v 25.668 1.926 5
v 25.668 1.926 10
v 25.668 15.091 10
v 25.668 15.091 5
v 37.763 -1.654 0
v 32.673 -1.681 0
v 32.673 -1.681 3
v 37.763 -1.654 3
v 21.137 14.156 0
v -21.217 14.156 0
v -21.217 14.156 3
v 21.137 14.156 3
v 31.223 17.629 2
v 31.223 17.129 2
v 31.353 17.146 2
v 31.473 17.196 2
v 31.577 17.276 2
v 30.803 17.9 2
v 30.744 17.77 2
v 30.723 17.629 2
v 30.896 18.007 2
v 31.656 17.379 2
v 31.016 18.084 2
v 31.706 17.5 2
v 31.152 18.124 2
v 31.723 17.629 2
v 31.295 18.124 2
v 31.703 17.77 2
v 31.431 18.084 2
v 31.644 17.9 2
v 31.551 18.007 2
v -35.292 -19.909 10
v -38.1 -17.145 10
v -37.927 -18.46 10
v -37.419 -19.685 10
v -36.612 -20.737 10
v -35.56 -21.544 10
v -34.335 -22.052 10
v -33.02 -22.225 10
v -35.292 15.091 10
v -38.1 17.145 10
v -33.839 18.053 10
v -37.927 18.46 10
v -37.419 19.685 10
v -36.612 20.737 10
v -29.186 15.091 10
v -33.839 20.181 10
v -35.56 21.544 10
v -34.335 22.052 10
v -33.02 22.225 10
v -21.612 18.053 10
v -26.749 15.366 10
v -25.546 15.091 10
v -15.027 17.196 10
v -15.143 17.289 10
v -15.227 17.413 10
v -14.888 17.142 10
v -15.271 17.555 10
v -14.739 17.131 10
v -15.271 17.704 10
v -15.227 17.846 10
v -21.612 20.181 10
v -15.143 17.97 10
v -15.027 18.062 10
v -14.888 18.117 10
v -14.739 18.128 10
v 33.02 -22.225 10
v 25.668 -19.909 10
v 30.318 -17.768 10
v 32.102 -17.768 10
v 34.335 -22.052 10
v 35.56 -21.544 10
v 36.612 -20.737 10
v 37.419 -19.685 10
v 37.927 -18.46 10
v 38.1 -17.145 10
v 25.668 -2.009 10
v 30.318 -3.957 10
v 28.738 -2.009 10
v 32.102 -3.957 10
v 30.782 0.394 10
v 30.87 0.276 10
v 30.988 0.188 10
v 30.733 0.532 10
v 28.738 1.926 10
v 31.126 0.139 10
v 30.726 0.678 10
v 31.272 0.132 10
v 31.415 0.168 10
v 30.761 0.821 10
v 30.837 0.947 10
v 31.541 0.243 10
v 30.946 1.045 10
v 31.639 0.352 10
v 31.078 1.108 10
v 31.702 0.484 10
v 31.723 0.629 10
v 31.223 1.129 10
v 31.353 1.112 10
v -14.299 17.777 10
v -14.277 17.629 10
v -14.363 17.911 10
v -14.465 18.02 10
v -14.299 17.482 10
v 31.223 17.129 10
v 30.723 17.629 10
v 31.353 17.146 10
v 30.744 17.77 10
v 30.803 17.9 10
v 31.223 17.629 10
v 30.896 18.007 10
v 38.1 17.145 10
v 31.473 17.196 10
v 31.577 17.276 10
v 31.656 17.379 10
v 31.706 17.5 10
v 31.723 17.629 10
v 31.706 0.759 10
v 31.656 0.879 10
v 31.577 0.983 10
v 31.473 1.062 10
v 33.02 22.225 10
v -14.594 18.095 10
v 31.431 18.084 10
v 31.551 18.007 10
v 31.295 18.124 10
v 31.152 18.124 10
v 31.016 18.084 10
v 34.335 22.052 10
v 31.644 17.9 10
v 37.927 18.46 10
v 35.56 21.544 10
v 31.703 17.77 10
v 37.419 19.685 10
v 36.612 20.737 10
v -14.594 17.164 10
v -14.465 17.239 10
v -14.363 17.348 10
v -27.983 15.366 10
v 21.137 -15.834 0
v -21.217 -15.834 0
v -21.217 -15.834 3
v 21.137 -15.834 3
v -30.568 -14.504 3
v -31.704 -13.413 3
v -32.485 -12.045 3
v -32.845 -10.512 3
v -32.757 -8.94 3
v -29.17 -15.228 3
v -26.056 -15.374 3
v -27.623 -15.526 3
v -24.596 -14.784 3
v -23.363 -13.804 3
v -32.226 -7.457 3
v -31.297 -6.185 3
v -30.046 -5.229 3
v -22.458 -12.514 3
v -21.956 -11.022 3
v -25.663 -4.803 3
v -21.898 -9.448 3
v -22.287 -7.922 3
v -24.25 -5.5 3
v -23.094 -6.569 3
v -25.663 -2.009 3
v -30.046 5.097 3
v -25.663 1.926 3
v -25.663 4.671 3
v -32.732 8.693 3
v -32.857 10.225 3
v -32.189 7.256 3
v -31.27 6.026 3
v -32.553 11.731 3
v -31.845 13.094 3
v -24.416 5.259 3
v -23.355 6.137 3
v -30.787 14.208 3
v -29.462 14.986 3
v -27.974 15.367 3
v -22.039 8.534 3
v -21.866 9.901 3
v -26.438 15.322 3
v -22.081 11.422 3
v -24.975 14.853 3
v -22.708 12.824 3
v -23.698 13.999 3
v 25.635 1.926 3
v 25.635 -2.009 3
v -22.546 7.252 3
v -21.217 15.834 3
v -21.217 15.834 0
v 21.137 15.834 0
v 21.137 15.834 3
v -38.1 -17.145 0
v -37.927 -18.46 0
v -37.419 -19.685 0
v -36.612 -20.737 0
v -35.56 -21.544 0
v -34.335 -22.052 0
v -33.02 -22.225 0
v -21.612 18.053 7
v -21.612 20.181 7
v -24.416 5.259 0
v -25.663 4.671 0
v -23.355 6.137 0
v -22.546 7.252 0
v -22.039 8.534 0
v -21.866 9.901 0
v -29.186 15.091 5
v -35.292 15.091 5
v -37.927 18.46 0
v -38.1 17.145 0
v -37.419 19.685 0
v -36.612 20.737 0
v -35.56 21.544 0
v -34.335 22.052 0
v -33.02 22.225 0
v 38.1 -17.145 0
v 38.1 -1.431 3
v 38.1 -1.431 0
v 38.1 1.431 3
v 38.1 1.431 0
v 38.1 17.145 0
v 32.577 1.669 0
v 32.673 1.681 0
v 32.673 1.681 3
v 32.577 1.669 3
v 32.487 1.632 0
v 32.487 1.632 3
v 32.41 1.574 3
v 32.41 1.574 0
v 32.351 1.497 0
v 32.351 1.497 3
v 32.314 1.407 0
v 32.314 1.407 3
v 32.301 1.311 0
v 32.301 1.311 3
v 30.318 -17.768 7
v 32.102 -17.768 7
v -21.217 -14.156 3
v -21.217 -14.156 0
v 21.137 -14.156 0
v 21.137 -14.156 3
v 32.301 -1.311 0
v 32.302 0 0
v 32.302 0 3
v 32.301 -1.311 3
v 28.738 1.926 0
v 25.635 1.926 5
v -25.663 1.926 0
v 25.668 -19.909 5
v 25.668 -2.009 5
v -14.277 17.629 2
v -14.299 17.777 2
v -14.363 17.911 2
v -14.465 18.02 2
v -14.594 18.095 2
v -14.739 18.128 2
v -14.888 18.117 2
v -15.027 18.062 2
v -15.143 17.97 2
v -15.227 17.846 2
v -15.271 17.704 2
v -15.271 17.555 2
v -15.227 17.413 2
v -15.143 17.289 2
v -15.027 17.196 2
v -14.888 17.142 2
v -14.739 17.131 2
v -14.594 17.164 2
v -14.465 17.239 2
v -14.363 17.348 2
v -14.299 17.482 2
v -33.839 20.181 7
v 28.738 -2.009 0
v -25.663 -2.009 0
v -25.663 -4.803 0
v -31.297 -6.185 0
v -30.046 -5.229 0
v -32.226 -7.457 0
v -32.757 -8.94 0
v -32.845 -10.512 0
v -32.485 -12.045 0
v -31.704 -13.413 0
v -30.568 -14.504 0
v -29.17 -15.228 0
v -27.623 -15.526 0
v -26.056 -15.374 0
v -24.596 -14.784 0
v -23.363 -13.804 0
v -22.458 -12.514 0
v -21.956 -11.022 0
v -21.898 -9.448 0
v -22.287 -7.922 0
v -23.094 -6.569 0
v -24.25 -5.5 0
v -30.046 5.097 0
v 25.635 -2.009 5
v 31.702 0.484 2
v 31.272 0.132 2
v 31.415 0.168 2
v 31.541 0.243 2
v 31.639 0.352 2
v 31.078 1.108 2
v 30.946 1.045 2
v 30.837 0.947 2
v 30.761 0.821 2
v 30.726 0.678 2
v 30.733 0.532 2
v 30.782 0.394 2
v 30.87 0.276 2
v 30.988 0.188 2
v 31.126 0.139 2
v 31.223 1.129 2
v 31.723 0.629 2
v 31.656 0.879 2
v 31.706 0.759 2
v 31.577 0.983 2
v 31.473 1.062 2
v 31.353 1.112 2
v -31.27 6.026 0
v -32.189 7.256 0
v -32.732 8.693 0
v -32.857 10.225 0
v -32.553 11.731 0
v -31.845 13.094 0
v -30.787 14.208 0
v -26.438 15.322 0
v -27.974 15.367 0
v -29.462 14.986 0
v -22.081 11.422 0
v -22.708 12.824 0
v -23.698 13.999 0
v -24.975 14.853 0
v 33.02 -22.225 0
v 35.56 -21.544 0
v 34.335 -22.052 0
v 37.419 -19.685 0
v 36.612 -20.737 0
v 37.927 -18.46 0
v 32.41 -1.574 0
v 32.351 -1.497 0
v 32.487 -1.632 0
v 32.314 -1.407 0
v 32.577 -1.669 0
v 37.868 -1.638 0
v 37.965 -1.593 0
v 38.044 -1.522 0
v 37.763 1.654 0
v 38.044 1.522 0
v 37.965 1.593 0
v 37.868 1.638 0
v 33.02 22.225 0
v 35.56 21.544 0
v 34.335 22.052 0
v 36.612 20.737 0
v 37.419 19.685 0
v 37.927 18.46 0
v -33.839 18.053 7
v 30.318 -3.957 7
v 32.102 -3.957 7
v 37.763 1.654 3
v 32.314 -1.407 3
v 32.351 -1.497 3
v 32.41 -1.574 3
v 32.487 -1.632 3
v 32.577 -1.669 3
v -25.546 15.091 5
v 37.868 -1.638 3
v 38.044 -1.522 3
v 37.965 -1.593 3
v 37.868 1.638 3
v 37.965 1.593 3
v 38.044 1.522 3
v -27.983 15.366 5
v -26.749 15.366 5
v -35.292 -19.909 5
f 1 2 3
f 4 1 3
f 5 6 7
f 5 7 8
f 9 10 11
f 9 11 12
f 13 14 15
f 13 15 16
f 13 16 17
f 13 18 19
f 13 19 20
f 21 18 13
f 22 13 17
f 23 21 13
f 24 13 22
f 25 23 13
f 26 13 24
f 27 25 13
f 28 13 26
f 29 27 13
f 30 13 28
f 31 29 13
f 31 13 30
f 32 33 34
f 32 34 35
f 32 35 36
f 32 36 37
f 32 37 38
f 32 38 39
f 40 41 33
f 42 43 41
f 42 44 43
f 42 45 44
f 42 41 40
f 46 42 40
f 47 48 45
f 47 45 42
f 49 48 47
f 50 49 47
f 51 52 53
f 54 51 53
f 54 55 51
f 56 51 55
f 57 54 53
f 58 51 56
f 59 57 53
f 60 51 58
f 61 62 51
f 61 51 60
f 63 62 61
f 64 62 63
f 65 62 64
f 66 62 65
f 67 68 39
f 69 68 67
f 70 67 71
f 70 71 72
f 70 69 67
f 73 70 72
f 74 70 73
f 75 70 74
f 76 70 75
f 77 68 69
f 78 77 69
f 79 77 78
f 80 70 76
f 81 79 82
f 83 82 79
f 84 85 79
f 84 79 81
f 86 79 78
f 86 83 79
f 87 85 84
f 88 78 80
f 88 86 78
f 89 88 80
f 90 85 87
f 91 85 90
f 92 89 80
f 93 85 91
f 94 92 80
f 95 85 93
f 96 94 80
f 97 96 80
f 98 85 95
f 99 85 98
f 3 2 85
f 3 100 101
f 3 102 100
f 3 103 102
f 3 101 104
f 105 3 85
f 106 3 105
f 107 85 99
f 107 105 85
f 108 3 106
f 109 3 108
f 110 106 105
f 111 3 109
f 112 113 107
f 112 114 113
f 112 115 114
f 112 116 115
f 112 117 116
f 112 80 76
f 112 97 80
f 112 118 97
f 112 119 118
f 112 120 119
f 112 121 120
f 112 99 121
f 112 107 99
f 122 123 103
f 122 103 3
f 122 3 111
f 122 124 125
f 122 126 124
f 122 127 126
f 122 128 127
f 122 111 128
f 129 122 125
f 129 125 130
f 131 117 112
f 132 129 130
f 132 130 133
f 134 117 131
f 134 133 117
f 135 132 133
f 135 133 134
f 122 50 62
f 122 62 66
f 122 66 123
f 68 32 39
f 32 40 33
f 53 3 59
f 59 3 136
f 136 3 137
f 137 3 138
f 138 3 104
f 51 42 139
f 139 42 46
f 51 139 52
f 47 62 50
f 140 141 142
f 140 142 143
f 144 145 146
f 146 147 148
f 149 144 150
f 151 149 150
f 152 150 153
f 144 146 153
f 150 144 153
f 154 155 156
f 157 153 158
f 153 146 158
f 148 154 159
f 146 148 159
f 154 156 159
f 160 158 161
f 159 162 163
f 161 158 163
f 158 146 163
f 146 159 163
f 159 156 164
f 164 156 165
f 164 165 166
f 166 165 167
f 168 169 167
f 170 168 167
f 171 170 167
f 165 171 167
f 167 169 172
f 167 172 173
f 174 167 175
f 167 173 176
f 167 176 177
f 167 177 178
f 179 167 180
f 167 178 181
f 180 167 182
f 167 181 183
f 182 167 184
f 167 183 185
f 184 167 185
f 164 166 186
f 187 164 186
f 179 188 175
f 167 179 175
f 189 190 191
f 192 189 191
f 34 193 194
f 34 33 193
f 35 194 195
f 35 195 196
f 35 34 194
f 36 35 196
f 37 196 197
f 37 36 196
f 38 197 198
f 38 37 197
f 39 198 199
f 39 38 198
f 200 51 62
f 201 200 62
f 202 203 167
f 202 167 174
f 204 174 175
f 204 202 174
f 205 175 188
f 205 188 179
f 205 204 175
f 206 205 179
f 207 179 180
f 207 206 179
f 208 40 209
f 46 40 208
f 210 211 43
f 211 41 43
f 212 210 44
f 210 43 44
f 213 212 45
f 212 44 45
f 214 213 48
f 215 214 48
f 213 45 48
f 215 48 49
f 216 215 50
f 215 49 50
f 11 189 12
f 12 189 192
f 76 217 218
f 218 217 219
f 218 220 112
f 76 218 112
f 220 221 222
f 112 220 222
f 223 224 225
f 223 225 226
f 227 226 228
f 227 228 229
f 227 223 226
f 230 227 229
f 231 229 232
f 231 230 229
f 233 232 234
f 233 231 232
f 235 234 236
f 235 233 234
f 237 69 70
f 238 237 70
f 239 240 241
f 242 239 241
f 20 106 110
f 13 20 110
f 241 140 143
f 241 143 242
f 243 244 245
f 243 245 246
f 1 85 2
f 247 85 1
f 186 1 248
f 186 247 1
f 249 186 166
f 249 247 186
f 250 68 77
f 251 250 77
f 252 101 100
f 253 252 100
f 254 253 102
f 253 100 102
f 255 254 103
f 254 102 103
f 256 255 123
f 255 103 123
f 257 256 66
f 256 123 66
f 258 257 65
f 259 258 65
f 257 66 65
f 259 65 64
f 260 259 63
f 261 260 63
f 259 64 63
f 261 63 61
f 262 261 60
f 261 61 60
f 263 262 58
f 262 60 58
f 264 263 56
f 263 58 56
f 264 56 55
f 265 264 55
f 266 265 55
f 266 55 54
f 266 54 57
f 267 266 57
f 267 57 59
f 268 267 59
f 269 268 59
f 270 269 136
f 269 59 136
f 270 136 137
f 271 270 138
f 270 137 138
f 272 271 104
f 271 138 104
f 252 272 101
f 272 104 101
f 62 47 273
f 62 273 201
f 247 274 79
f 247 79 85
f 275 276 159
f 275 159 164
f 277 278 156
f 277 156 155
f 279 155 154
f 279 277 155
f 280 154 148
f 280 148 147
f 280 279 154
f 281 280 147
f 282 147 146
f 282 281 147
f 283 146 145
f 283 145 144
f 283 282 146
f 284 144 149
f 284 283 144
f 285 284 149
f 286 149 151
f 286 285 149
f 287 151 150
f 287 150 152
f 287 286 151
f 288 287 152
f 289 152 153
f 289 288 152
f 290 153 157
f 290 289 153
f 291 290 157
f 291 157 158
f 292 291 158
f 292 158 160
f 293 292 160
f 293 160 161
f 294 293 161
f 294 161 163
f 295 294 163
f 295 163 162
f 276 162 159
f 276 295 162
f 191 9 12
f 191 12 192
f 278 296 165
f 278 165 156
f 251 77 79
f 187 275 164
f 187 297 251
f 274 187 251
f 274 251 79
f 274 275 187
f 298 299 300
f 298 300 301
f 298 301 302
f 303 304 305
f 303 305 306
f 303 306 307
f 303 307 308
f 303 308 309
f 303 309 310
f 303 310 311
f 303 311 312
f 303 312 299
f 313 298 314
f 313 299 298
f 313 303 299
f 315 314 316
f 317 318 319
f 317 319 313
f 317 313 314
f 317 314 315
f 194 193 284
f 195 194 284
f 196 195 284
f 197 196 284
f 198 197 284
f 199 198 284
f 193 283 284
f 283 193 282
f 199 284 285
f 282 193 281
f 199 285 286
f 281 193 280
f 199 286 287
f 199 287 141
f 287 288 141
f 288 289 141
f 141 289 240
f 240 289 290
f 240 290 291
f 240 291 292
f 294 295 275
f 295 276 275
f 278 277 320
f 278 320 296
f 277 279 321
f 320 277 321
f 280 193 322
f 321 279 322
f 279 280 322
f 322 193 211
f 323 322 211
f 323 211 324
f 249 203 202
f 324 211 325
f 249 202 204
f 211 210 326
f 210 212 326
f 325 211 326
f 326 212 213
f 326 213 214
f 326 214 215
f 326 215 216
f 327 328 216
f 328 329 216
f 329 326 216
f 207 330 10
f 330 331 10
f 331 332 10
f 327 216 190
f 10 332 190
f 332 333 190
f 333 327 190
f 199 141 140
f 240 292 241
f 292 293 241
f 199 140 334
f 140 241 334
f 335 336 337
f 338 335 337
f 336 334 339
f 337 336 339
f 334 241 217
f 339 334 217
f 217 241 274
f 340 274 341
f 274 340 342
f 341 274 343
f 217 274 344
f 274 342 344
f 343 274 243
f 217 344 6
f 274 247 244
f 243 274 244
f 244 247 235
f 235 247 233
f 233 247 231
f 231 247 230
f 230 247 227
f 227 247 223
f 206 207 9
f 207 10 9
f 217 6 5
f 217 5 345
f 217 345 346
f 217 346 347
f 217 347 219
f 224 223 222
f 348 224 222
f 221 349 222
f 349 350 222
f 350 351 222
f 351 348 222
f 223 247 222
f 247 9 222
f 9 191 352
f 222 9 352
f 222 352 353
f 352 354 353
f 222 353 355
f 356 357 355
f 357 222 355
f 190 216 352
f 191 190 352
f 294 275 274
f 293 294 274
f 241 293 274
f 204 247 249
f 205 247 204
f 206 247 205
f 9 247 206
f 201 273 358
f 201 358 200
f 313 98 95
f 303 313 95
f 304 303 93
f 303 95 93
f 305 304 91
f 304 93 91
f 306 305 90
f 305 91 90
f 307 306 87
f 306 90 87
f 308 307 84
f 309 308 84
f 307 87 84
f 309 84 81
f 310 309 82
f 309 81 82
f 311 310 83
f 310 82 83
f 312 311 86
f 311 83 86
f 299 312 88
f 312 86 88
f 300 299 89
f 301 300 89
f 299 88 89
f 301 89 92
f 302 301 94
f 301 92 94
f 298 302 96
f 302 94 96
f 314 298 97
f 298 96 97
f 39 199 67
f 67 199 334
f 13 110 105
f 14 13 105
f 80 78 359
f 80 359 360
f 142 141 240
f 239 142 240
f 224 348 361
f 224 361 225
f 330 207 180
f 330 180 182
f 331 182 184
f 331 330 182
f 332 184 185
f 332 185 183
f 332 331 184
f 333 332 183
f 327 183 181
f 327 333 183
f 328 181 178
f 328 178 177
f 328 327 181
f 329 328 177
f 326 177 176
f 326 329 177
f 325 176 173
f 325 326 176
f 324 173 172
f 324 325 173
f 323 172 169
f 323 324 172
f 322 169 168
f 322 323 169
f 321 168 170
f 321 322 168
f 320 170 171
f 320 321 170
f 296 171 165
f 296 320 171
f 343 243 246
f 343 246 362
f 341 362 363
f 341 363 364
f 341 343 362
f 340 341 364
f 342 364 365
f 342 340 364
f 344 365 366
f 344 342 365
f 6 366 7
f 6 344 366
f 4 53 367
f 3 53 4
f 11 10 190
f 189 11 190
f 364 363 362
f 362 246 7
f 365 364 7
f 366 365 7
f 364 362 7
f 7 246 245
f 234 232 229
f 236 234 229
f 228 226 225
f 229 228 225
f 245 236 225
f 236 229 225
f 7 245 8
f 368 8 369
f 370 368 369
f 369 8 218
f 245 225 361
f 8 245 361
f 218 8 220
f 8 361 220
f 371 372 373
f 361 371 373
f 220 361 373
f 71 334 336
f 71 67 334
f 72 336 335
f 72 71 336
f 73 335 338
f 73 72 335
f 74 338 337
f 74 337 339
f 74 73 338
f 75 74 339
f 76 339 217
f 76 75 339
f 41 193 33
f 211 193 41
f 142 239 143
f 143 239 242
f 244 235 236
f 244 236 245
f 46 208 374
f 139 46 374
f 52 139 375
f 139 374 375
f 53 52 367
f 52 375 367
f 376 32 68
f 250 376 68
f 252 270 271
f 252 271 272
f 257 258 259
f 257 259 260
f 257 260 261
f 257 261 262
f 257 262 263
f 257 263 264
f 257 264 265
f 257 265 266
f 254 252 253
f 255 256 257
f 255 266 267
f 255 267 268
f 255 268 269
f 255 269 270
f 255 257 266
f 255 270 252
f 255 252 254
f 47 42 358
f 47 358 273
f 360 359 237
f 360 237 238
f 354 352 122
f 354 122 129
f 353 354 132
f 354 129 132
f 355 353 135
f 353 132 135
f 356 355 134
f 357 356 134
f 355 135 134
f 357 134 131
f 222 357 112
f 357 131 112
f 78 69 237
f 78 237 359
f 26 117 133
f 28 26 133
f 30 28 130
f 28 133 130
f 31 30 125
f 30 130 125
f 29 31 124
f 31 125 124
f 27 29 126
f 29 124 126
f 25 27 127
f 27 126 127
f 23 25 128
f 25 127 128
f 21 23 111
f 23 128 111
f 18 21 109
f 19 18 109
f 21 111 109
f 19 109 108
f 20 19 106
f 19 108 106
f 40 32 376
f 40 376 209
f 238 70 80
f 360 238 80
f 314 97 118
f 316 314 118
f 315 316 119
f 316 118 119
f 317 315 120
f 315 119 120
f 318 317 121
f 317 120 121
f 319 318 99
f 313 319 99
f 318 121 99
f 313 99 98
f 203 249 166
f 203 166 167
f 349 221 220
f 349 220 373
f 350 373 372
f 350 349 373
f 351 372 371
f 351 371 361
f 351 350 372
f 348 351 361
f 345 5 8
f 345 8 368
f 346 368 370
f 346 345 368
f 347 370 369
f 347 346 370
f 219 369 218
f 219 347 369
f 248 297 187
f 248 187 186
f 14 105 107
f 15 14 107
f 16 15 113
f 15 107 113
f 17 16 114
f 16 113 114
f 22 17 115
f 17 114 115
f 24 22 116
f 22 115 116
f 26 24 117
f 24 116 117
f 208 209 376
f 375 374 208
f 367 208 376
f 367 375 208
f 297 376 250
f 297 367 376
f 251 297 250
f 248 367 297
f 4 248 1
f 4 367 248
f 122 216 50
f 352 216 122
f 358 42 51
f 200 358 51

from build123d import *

# Parameters (mm, degrees)
F0_W      = 76.2
F0_H      = 44.45
F1_DEPTH  = 10
F3_W      = 60.96
F3_H      = 35
F5_DEPTH  = 5
F6_DEPTH  = 3
F7_DEPTH  = 5
F8_DEPTH  = 3
F9_R      = 5.08
F10_W     = 3.1023733318
F10_H     = 3.9349872386
F11_DEPTH = 11
F12_W     = 42.3543415964
F12_H     = 1.6788681969
F13_DEPTH = 3
F4_R      = 0.5
F14_DEPTH = 8
F16_DEPTH = 3
F17_W     = 1.7839074135
F17_H     = 13.8109410182
F17_W_2   = 12.2273676097
F17_H_2   = 2.1280329674
F18_DEPTH = 3


with BuildPart() as f1:
    # F0 (on Top) → F1 (new body)
    with BuildSketch(Plane.XY):
        Rectangle(F0_W, F0_H)
        with BuildLine():
            Line((-30.0455586378, -5.2290757074), (-30.0455586378, 5.0972730335))
            ThreePointArc((-30.0455586378, 5.0972730335), (-30.1515789958, 14.6432590947), (-21.8663889779, 9.9006104081))
            ThreePointArc((-21.8663889779, 9.9006104081), (-22.9155259968, 6.6695395757), (-25.6626866956, 4.6711363874))
            Line((-25.6626866956, 4.6711363874), (-25.6626866956, 1.9259689143))
            Line((-25.6626866956, 1.9259689143), (26.3650547713, 1.9259689143))
            Line((26.3650547713, 1.9259689143), (28.737584129, 1.9259689143))
            Line((28.737584129, 1.9259689143), (28.737584129, -2.0090183243))
            Line((28.737584129, -2.0090183243), (26.3650547713, -2.0090183243))
            Line((26.3650547713, -2.0090183243), (-25.6626866956, -2.0090183243))
            Line((-25.6626866956, -2.0090183243), (-25.6626866956, -4.8029390612))
            ThreePointArc((-25.6626866956, -4.8029390612), (-22.9155259968, -6.8013422496), (-21.8663889779, -10.0324130819))
            ThreePointArc((-21.8663889779, -10.0324130819), (-30.1515789958, -14.7750617685), (-30.0455586378, -5.2290757074))
        make_face(mode=Mode.SUBTRACT)
    extrude(amount=F1_DEPTH)

    # F3 (on face) → F5 (cut)
    with BuildSketch(Plane.XY.offset(10)):
        with Locations((-4.8115077713, -2.409234643)):
            Rectangle(F3_W, F3_H)
    extrude(amount=-F5_DEPTH, mode=Mode.SUBTRACT)

    # F0 (on Top) → F6 (cut)
    with BuildSketch(Plane.XY):
        with BuildLine():
            ThreePointArc((-30.0455586378, 5.0972730335), (-28.7505212765, 4.5776246125), (-27.3663889779, 4.4006104081))
            ThreePointArc((-27.3663889779, 4.4006104081), (-26.5038656779, 4.468662916), (-25.6626866956, 4.6711363874))
            ThreePointArc((-25.6626866956, 4.6711363874), (-22.9155259968, 6.6695395757), (-21.8663889779, 9.9006104081))
            ThreePointArc((-21.8663889779, 9.9006104081), (-30.1515789958, 14.6432590947), (-30.0455586378, 5.0972730335))
        make_face()
        with BuildLine():
            ThreePointArc((-25.6626866956, -4.8029390612), (-26.5038656779, -4.6004655898), (-27.3663889779, -4.5324130819))
            ThreePointArc((-27.3663889779, -4.5324130819), (-28.7505212765, -4.7094272864), (-30.0455586378, -5.2290757074))
            ThreePointArc((-30.0455586378, -5.2290757074), (-30.1515789958, -14.7750617685), (-21.8663889779, -10.0324130819))
            ThreePointArc((-21.8663889779, -10.0324130819), (-22.9155259968, -6.8013422496), (-25.6626866956, -4.8029390612))
        make_face()
    extrude(amount=F6_DEPTH, mode=Mode.SUBTRACT)

    # F0 (on Top) → F7 (join)
    with BuildSketch(Plane.XY):
        Polygon((26.3650547713, 1.9259689143), (-25.6626866956, 1.9259689143), (-25.6626866956, -2.0090183243), (26.3650547713, -2.0090183243), (28.737584129, -2.0090183243), (28.737584129, 1.9259689143), align=None)
        with BuildLine():
            ThreePointArc((-25.6626866956, -4.8029390612), (-26.5038656779, -4.6004655898), (-27.3663889779, -4.5324130819))
            ThreePointArc((-27.3663889779, -4.5324130819), (-28.7505212765, -4.7094272864), (-30.0455586378, -5.2290757074))
            ThreePointArc((-30.0455586378, -5.2290757074), (-30.1515789958, -14.7750617685), (-21.8663889779, -10.0324130819))
            ThreePointArc((-21.8663889779, -10.0324130819), (-22.9155259968, -6.8013422496), (-25.6626866956, -4.8029390612))
        make_face()
        with BuildLine():
            Line((-27.3663889779, -4.5324130819), (-27.3663889779, 4.4006104081))
            ThreePointArc((-27.3663889779, 4.4006104081), (-28.7505212765, 4.5776246125), (-30.0455586378, 5.0972730335))
            Line((-30.0455586378, 5.0972730335), (-30.0455586378, -5.2290757074))
            ThreePointArc((-30.0455586378, -5.2290757074), (-28.7505212765, -4.7094272864), (-27.3663889779, -4.5324130819))
        make_face()
        with BuildLine():
            ThreePointArc((-30.0455586378, 5.0972730335), (-28.7505212765, 4.5776246125), (-27.3663889779, 4.4006104081))
            ThreePointArc((-27.3663889779, 4.4006104081), (-26.5038656779, 4.468662916), (-25.6626866956, 4.6711363874))
            ThreePointArc((-25.6626866956, 4.6711363874), (-22.9155259968, 6.6695395757), (-21.8663889779, 9.9006104081))
            ThreePointArc((-21.8663889779, 9.9006104081), (-30.1515789958, 14.6432590947), (-30.0455586378, 5.0972730335))
        make_face()
        with BuildLine():
            ThreePointArc((-25.6626866956, 4.6711363874), (-26.5038656779, 4.468662916), (-27.3663889779, 4.4006104081))
            Line((-27.3663889779, 4.4006104081), (-27.3663889779, -4.5324130819))
            ThreePointArc((-27.3663889779, -4.5324130819), (-26.5038656779, -4.6004655898), (-25.6626866956, -4.8029390612))
            Line((-25.6626866956, -4.8029390612), (-25.6626866956, -2.0090183243))
            Line((-25.6626866956, -2.0090183243), (-25.6626866956, 1.9259689143))
            Line((-25.6626866956, 1.9259689143), (-25.6626866956, 4.6711363874))
        make_face()
    extrude(amount=F7_DEPTH)

    # F0 (on Top) → F8 (cut)
    with BuildSketch(Plane.XY):
        Polygon((26.3650547713, 1.9259689143), (-25.6626866956, 1.9259689143), (-25.6626866956, -2.0090183243), (26.3650547713, -2.0090183243), (28.737584129, -2.0090183243), (28.737584129, 1.9259689143), align=None)
        with BuildLine():
            ThreePointArc((-30.0455586378, 5.0972730335), (-28.7505212765, 4.5776246125), (-27.3663889779, 4.4006104081))
            ThreePointArc((-27.3663889779, 4.4006104081), (-26.5038656779, 4.468662916), (-25.6626866956, 4.6711363874))
            ThreePointArc((-25.6626866956, 4.6711363874), (-22.9155259968, 6.6695395757), (-21.8663889779, 9.9006104081))
            ThreePointArc((-21.8663889779, 9.9006104081), (-30.1515789958, 14.6432590947), (-30.0455586378, 5.0972730335))
        make_face()
        with BuildLine():
            Line((-27.3663889779, -4.5324130819), (-27.3663889779, 4.4006104081))
            ThreePointArc((-27.3663889779, 4.4006104081), (-28.7505212765, 4.5776246125), (-30.0455586378, 5.0972730335))
            Line((-30.0455586378, 5.0972730335), (-30.0455586378, -5.2290757074))
            ThreePointArc((-30.0455586378, -5.2290757074), (-28.7505212765, -4.7094272864), (-27.3663889779, -4.5324130819))
        make_face()
        with BuildLine():
            ThreePointArc((-25.6626866956, 4.6711363874), (-26.5038656779, 4.468662916), (-27.3663889779, 4.4006104081))
            Line((-27.3663889779, 4.4006104081), (-27.3663889779, -4.5324130819))
            ThreePointArc((-27.3663889779, -4.5324130819), (-26.5038656779, -4.6004655898), (-25.6626866956, -4.8029390612))
            Line((-25.6626866956, -4.8029390612), (-25.6626866956, -2.0090183243))
            Line((-25.6626866956, -2.0090183243), (-25.6626866956, 1.9259689143))
            Line((-25.6626866956, 1.9259689143), (-25.6626866956, 4.6711363874))
        make_face()
        with BuildLine():
            ThreePointArc((-25.6626866956, -4.8029390612), (-26.5038656779, -4.6004655898), (-27.3663889779, -4.5324130819))
            ThreePointArc((-27.3663889779, -4.5324130819), (-28.7505212765, -4.7094272864), (-30.0455586378, -5.2290757074))
            ThreePointArc((-30.0455586378, -5.2290757074), (-30.1515789958, -14.7750617685), (-21.8663889779, -10.0324130819))
            ThreePointArc((-21.8663889779, -10.0324130819), (-22.9155259968, -6.8013422496), (-25.6626866956, -4.8029390612))
        make_face()
    extrude(amount=F8_DEPTH, mode=Mode.SUBTRACT)

    # F9
    f9_edges = [f1.edges().sort_by_distance(p)[0] for p in [
        (38.1, 22.225, 5),
        (38.1, -22.225, 5),
        (-38.1, -22.225, 5),
        (-38.1, 22.225, 5),
    ]]
    fillet(f9_edges, radius=F9_R)

    # F10 (on face) → F11 (cut)
    with BuildSketch(Plane.XY.offset(10)):
        with Locations((27.1863974631, -0.041524705)):
            Rectangle(F10_W, F10_H)
    extrude(amount=-F11_DEPTH, mode=Mode.SUBTRACT)

    # F12 (on face) → F13 (cut)
    with BuildSketch(Plane.XY):
        with Locations((-0.0403206795, -14.995015692)):
            Rectangle(F12_W, F12_H)
        with Locations((-0.0403206795, 14.995015692)):
            Rectangle(F12_W, F12_H)
    extrude(amount=F13_DEPTH, mode=Mode.SUBTRACT)

    # F4 (on face) → F14 (cut)
    with BuildSketch(Plane.XY.offset(10)):
        with Locations((-14.7766097486, 17.6294427365)):
            Circle(F4_R)
        with BuildLine():
            Line((30.7233902514, 17.6294427365), (31.2233902514, 17.6294427365))
            Line((31.2233902514, 17.6294427365), (31.2233902514, 17.1294427365))
            ThreePointArc((31.2233902514, 17.1294427365), (31.576943642, 17.2758893459), (31.7233902514, 17.6294427365))
            ThreePointArc((31.7233902514, 17.6294427365), (31.2233902514, 18.1294427365), (30.7233902514, 17.6294427365))
        make_face()
        with BuildLine():
            ThreePointArc((31.7233902514, 0.6294427365), (31.576943642, 0.9829961271), (31.2233902514, 1.1294427365))
            ThreePointArc((31.2233902514, 1.1294427365), (30.8698368608, 0.2758893459), (31.7233902514, 0.6294427365))
        make_face()
    extrude(amount=-F14_DEPTH, mode=Mode.SUBTRACT)

    # F15 (on face) → F16 (cut)
    with BuildSketch(Plane.XY):
        with BuildLine():
            Line((32.6728916039, -1.6812667771), (37.7627563252, -1.6541663098))
            ThreePointArc((37.7627563252, -1.6541663098), (37.9645099731, -1.5929708523), (38.1, -1.4314410684))
            Line((38.1, -1.4314410684), (38.1, 1.4314410684))
            ThreePointArc((38.1, 1.4314410684), (37.9645099731, 1.5929708523), (37.7627563252, 1.6541663098))
            Line((37.7627563252, 1.6541663098), (32.6728916039, 1.6812667771))
            ThreePointArc((32.6728916039, 1.6812667771), (32.4101390596, 1.5736086497), (32.3012533523, 1.3113624396))
            Line((32.3012533523, 1.3113624396), (32.3021029201, 0))
            Line((32.3021029201, 0), (32.3012533523, -1.3113624396))
            ThreePointArc((32.3012533523, -1.3113624396), (32.4101390596, -1.5736086497), (32.6728916039, -1.6812667771))
        make_face()
    extrude(amount=F16_DEPTH, mode=Mode.SUBTRACT)

    # F17 (on face) → F18 (cut)
    with BuildSketch(Plane.XY.offset(10)):
        with Locations((31.2101058662, -10.862109717)):
            Rectangle(F17_W, F17_H)
        with Locations((-27.7256574482, 19.1172780469)):
            Rectangle(F17_W_2, F17_H_2)
    extrude(amount=-F18_DEPTH, mode=Mode.SUBTRACT)


solid = f1.part
